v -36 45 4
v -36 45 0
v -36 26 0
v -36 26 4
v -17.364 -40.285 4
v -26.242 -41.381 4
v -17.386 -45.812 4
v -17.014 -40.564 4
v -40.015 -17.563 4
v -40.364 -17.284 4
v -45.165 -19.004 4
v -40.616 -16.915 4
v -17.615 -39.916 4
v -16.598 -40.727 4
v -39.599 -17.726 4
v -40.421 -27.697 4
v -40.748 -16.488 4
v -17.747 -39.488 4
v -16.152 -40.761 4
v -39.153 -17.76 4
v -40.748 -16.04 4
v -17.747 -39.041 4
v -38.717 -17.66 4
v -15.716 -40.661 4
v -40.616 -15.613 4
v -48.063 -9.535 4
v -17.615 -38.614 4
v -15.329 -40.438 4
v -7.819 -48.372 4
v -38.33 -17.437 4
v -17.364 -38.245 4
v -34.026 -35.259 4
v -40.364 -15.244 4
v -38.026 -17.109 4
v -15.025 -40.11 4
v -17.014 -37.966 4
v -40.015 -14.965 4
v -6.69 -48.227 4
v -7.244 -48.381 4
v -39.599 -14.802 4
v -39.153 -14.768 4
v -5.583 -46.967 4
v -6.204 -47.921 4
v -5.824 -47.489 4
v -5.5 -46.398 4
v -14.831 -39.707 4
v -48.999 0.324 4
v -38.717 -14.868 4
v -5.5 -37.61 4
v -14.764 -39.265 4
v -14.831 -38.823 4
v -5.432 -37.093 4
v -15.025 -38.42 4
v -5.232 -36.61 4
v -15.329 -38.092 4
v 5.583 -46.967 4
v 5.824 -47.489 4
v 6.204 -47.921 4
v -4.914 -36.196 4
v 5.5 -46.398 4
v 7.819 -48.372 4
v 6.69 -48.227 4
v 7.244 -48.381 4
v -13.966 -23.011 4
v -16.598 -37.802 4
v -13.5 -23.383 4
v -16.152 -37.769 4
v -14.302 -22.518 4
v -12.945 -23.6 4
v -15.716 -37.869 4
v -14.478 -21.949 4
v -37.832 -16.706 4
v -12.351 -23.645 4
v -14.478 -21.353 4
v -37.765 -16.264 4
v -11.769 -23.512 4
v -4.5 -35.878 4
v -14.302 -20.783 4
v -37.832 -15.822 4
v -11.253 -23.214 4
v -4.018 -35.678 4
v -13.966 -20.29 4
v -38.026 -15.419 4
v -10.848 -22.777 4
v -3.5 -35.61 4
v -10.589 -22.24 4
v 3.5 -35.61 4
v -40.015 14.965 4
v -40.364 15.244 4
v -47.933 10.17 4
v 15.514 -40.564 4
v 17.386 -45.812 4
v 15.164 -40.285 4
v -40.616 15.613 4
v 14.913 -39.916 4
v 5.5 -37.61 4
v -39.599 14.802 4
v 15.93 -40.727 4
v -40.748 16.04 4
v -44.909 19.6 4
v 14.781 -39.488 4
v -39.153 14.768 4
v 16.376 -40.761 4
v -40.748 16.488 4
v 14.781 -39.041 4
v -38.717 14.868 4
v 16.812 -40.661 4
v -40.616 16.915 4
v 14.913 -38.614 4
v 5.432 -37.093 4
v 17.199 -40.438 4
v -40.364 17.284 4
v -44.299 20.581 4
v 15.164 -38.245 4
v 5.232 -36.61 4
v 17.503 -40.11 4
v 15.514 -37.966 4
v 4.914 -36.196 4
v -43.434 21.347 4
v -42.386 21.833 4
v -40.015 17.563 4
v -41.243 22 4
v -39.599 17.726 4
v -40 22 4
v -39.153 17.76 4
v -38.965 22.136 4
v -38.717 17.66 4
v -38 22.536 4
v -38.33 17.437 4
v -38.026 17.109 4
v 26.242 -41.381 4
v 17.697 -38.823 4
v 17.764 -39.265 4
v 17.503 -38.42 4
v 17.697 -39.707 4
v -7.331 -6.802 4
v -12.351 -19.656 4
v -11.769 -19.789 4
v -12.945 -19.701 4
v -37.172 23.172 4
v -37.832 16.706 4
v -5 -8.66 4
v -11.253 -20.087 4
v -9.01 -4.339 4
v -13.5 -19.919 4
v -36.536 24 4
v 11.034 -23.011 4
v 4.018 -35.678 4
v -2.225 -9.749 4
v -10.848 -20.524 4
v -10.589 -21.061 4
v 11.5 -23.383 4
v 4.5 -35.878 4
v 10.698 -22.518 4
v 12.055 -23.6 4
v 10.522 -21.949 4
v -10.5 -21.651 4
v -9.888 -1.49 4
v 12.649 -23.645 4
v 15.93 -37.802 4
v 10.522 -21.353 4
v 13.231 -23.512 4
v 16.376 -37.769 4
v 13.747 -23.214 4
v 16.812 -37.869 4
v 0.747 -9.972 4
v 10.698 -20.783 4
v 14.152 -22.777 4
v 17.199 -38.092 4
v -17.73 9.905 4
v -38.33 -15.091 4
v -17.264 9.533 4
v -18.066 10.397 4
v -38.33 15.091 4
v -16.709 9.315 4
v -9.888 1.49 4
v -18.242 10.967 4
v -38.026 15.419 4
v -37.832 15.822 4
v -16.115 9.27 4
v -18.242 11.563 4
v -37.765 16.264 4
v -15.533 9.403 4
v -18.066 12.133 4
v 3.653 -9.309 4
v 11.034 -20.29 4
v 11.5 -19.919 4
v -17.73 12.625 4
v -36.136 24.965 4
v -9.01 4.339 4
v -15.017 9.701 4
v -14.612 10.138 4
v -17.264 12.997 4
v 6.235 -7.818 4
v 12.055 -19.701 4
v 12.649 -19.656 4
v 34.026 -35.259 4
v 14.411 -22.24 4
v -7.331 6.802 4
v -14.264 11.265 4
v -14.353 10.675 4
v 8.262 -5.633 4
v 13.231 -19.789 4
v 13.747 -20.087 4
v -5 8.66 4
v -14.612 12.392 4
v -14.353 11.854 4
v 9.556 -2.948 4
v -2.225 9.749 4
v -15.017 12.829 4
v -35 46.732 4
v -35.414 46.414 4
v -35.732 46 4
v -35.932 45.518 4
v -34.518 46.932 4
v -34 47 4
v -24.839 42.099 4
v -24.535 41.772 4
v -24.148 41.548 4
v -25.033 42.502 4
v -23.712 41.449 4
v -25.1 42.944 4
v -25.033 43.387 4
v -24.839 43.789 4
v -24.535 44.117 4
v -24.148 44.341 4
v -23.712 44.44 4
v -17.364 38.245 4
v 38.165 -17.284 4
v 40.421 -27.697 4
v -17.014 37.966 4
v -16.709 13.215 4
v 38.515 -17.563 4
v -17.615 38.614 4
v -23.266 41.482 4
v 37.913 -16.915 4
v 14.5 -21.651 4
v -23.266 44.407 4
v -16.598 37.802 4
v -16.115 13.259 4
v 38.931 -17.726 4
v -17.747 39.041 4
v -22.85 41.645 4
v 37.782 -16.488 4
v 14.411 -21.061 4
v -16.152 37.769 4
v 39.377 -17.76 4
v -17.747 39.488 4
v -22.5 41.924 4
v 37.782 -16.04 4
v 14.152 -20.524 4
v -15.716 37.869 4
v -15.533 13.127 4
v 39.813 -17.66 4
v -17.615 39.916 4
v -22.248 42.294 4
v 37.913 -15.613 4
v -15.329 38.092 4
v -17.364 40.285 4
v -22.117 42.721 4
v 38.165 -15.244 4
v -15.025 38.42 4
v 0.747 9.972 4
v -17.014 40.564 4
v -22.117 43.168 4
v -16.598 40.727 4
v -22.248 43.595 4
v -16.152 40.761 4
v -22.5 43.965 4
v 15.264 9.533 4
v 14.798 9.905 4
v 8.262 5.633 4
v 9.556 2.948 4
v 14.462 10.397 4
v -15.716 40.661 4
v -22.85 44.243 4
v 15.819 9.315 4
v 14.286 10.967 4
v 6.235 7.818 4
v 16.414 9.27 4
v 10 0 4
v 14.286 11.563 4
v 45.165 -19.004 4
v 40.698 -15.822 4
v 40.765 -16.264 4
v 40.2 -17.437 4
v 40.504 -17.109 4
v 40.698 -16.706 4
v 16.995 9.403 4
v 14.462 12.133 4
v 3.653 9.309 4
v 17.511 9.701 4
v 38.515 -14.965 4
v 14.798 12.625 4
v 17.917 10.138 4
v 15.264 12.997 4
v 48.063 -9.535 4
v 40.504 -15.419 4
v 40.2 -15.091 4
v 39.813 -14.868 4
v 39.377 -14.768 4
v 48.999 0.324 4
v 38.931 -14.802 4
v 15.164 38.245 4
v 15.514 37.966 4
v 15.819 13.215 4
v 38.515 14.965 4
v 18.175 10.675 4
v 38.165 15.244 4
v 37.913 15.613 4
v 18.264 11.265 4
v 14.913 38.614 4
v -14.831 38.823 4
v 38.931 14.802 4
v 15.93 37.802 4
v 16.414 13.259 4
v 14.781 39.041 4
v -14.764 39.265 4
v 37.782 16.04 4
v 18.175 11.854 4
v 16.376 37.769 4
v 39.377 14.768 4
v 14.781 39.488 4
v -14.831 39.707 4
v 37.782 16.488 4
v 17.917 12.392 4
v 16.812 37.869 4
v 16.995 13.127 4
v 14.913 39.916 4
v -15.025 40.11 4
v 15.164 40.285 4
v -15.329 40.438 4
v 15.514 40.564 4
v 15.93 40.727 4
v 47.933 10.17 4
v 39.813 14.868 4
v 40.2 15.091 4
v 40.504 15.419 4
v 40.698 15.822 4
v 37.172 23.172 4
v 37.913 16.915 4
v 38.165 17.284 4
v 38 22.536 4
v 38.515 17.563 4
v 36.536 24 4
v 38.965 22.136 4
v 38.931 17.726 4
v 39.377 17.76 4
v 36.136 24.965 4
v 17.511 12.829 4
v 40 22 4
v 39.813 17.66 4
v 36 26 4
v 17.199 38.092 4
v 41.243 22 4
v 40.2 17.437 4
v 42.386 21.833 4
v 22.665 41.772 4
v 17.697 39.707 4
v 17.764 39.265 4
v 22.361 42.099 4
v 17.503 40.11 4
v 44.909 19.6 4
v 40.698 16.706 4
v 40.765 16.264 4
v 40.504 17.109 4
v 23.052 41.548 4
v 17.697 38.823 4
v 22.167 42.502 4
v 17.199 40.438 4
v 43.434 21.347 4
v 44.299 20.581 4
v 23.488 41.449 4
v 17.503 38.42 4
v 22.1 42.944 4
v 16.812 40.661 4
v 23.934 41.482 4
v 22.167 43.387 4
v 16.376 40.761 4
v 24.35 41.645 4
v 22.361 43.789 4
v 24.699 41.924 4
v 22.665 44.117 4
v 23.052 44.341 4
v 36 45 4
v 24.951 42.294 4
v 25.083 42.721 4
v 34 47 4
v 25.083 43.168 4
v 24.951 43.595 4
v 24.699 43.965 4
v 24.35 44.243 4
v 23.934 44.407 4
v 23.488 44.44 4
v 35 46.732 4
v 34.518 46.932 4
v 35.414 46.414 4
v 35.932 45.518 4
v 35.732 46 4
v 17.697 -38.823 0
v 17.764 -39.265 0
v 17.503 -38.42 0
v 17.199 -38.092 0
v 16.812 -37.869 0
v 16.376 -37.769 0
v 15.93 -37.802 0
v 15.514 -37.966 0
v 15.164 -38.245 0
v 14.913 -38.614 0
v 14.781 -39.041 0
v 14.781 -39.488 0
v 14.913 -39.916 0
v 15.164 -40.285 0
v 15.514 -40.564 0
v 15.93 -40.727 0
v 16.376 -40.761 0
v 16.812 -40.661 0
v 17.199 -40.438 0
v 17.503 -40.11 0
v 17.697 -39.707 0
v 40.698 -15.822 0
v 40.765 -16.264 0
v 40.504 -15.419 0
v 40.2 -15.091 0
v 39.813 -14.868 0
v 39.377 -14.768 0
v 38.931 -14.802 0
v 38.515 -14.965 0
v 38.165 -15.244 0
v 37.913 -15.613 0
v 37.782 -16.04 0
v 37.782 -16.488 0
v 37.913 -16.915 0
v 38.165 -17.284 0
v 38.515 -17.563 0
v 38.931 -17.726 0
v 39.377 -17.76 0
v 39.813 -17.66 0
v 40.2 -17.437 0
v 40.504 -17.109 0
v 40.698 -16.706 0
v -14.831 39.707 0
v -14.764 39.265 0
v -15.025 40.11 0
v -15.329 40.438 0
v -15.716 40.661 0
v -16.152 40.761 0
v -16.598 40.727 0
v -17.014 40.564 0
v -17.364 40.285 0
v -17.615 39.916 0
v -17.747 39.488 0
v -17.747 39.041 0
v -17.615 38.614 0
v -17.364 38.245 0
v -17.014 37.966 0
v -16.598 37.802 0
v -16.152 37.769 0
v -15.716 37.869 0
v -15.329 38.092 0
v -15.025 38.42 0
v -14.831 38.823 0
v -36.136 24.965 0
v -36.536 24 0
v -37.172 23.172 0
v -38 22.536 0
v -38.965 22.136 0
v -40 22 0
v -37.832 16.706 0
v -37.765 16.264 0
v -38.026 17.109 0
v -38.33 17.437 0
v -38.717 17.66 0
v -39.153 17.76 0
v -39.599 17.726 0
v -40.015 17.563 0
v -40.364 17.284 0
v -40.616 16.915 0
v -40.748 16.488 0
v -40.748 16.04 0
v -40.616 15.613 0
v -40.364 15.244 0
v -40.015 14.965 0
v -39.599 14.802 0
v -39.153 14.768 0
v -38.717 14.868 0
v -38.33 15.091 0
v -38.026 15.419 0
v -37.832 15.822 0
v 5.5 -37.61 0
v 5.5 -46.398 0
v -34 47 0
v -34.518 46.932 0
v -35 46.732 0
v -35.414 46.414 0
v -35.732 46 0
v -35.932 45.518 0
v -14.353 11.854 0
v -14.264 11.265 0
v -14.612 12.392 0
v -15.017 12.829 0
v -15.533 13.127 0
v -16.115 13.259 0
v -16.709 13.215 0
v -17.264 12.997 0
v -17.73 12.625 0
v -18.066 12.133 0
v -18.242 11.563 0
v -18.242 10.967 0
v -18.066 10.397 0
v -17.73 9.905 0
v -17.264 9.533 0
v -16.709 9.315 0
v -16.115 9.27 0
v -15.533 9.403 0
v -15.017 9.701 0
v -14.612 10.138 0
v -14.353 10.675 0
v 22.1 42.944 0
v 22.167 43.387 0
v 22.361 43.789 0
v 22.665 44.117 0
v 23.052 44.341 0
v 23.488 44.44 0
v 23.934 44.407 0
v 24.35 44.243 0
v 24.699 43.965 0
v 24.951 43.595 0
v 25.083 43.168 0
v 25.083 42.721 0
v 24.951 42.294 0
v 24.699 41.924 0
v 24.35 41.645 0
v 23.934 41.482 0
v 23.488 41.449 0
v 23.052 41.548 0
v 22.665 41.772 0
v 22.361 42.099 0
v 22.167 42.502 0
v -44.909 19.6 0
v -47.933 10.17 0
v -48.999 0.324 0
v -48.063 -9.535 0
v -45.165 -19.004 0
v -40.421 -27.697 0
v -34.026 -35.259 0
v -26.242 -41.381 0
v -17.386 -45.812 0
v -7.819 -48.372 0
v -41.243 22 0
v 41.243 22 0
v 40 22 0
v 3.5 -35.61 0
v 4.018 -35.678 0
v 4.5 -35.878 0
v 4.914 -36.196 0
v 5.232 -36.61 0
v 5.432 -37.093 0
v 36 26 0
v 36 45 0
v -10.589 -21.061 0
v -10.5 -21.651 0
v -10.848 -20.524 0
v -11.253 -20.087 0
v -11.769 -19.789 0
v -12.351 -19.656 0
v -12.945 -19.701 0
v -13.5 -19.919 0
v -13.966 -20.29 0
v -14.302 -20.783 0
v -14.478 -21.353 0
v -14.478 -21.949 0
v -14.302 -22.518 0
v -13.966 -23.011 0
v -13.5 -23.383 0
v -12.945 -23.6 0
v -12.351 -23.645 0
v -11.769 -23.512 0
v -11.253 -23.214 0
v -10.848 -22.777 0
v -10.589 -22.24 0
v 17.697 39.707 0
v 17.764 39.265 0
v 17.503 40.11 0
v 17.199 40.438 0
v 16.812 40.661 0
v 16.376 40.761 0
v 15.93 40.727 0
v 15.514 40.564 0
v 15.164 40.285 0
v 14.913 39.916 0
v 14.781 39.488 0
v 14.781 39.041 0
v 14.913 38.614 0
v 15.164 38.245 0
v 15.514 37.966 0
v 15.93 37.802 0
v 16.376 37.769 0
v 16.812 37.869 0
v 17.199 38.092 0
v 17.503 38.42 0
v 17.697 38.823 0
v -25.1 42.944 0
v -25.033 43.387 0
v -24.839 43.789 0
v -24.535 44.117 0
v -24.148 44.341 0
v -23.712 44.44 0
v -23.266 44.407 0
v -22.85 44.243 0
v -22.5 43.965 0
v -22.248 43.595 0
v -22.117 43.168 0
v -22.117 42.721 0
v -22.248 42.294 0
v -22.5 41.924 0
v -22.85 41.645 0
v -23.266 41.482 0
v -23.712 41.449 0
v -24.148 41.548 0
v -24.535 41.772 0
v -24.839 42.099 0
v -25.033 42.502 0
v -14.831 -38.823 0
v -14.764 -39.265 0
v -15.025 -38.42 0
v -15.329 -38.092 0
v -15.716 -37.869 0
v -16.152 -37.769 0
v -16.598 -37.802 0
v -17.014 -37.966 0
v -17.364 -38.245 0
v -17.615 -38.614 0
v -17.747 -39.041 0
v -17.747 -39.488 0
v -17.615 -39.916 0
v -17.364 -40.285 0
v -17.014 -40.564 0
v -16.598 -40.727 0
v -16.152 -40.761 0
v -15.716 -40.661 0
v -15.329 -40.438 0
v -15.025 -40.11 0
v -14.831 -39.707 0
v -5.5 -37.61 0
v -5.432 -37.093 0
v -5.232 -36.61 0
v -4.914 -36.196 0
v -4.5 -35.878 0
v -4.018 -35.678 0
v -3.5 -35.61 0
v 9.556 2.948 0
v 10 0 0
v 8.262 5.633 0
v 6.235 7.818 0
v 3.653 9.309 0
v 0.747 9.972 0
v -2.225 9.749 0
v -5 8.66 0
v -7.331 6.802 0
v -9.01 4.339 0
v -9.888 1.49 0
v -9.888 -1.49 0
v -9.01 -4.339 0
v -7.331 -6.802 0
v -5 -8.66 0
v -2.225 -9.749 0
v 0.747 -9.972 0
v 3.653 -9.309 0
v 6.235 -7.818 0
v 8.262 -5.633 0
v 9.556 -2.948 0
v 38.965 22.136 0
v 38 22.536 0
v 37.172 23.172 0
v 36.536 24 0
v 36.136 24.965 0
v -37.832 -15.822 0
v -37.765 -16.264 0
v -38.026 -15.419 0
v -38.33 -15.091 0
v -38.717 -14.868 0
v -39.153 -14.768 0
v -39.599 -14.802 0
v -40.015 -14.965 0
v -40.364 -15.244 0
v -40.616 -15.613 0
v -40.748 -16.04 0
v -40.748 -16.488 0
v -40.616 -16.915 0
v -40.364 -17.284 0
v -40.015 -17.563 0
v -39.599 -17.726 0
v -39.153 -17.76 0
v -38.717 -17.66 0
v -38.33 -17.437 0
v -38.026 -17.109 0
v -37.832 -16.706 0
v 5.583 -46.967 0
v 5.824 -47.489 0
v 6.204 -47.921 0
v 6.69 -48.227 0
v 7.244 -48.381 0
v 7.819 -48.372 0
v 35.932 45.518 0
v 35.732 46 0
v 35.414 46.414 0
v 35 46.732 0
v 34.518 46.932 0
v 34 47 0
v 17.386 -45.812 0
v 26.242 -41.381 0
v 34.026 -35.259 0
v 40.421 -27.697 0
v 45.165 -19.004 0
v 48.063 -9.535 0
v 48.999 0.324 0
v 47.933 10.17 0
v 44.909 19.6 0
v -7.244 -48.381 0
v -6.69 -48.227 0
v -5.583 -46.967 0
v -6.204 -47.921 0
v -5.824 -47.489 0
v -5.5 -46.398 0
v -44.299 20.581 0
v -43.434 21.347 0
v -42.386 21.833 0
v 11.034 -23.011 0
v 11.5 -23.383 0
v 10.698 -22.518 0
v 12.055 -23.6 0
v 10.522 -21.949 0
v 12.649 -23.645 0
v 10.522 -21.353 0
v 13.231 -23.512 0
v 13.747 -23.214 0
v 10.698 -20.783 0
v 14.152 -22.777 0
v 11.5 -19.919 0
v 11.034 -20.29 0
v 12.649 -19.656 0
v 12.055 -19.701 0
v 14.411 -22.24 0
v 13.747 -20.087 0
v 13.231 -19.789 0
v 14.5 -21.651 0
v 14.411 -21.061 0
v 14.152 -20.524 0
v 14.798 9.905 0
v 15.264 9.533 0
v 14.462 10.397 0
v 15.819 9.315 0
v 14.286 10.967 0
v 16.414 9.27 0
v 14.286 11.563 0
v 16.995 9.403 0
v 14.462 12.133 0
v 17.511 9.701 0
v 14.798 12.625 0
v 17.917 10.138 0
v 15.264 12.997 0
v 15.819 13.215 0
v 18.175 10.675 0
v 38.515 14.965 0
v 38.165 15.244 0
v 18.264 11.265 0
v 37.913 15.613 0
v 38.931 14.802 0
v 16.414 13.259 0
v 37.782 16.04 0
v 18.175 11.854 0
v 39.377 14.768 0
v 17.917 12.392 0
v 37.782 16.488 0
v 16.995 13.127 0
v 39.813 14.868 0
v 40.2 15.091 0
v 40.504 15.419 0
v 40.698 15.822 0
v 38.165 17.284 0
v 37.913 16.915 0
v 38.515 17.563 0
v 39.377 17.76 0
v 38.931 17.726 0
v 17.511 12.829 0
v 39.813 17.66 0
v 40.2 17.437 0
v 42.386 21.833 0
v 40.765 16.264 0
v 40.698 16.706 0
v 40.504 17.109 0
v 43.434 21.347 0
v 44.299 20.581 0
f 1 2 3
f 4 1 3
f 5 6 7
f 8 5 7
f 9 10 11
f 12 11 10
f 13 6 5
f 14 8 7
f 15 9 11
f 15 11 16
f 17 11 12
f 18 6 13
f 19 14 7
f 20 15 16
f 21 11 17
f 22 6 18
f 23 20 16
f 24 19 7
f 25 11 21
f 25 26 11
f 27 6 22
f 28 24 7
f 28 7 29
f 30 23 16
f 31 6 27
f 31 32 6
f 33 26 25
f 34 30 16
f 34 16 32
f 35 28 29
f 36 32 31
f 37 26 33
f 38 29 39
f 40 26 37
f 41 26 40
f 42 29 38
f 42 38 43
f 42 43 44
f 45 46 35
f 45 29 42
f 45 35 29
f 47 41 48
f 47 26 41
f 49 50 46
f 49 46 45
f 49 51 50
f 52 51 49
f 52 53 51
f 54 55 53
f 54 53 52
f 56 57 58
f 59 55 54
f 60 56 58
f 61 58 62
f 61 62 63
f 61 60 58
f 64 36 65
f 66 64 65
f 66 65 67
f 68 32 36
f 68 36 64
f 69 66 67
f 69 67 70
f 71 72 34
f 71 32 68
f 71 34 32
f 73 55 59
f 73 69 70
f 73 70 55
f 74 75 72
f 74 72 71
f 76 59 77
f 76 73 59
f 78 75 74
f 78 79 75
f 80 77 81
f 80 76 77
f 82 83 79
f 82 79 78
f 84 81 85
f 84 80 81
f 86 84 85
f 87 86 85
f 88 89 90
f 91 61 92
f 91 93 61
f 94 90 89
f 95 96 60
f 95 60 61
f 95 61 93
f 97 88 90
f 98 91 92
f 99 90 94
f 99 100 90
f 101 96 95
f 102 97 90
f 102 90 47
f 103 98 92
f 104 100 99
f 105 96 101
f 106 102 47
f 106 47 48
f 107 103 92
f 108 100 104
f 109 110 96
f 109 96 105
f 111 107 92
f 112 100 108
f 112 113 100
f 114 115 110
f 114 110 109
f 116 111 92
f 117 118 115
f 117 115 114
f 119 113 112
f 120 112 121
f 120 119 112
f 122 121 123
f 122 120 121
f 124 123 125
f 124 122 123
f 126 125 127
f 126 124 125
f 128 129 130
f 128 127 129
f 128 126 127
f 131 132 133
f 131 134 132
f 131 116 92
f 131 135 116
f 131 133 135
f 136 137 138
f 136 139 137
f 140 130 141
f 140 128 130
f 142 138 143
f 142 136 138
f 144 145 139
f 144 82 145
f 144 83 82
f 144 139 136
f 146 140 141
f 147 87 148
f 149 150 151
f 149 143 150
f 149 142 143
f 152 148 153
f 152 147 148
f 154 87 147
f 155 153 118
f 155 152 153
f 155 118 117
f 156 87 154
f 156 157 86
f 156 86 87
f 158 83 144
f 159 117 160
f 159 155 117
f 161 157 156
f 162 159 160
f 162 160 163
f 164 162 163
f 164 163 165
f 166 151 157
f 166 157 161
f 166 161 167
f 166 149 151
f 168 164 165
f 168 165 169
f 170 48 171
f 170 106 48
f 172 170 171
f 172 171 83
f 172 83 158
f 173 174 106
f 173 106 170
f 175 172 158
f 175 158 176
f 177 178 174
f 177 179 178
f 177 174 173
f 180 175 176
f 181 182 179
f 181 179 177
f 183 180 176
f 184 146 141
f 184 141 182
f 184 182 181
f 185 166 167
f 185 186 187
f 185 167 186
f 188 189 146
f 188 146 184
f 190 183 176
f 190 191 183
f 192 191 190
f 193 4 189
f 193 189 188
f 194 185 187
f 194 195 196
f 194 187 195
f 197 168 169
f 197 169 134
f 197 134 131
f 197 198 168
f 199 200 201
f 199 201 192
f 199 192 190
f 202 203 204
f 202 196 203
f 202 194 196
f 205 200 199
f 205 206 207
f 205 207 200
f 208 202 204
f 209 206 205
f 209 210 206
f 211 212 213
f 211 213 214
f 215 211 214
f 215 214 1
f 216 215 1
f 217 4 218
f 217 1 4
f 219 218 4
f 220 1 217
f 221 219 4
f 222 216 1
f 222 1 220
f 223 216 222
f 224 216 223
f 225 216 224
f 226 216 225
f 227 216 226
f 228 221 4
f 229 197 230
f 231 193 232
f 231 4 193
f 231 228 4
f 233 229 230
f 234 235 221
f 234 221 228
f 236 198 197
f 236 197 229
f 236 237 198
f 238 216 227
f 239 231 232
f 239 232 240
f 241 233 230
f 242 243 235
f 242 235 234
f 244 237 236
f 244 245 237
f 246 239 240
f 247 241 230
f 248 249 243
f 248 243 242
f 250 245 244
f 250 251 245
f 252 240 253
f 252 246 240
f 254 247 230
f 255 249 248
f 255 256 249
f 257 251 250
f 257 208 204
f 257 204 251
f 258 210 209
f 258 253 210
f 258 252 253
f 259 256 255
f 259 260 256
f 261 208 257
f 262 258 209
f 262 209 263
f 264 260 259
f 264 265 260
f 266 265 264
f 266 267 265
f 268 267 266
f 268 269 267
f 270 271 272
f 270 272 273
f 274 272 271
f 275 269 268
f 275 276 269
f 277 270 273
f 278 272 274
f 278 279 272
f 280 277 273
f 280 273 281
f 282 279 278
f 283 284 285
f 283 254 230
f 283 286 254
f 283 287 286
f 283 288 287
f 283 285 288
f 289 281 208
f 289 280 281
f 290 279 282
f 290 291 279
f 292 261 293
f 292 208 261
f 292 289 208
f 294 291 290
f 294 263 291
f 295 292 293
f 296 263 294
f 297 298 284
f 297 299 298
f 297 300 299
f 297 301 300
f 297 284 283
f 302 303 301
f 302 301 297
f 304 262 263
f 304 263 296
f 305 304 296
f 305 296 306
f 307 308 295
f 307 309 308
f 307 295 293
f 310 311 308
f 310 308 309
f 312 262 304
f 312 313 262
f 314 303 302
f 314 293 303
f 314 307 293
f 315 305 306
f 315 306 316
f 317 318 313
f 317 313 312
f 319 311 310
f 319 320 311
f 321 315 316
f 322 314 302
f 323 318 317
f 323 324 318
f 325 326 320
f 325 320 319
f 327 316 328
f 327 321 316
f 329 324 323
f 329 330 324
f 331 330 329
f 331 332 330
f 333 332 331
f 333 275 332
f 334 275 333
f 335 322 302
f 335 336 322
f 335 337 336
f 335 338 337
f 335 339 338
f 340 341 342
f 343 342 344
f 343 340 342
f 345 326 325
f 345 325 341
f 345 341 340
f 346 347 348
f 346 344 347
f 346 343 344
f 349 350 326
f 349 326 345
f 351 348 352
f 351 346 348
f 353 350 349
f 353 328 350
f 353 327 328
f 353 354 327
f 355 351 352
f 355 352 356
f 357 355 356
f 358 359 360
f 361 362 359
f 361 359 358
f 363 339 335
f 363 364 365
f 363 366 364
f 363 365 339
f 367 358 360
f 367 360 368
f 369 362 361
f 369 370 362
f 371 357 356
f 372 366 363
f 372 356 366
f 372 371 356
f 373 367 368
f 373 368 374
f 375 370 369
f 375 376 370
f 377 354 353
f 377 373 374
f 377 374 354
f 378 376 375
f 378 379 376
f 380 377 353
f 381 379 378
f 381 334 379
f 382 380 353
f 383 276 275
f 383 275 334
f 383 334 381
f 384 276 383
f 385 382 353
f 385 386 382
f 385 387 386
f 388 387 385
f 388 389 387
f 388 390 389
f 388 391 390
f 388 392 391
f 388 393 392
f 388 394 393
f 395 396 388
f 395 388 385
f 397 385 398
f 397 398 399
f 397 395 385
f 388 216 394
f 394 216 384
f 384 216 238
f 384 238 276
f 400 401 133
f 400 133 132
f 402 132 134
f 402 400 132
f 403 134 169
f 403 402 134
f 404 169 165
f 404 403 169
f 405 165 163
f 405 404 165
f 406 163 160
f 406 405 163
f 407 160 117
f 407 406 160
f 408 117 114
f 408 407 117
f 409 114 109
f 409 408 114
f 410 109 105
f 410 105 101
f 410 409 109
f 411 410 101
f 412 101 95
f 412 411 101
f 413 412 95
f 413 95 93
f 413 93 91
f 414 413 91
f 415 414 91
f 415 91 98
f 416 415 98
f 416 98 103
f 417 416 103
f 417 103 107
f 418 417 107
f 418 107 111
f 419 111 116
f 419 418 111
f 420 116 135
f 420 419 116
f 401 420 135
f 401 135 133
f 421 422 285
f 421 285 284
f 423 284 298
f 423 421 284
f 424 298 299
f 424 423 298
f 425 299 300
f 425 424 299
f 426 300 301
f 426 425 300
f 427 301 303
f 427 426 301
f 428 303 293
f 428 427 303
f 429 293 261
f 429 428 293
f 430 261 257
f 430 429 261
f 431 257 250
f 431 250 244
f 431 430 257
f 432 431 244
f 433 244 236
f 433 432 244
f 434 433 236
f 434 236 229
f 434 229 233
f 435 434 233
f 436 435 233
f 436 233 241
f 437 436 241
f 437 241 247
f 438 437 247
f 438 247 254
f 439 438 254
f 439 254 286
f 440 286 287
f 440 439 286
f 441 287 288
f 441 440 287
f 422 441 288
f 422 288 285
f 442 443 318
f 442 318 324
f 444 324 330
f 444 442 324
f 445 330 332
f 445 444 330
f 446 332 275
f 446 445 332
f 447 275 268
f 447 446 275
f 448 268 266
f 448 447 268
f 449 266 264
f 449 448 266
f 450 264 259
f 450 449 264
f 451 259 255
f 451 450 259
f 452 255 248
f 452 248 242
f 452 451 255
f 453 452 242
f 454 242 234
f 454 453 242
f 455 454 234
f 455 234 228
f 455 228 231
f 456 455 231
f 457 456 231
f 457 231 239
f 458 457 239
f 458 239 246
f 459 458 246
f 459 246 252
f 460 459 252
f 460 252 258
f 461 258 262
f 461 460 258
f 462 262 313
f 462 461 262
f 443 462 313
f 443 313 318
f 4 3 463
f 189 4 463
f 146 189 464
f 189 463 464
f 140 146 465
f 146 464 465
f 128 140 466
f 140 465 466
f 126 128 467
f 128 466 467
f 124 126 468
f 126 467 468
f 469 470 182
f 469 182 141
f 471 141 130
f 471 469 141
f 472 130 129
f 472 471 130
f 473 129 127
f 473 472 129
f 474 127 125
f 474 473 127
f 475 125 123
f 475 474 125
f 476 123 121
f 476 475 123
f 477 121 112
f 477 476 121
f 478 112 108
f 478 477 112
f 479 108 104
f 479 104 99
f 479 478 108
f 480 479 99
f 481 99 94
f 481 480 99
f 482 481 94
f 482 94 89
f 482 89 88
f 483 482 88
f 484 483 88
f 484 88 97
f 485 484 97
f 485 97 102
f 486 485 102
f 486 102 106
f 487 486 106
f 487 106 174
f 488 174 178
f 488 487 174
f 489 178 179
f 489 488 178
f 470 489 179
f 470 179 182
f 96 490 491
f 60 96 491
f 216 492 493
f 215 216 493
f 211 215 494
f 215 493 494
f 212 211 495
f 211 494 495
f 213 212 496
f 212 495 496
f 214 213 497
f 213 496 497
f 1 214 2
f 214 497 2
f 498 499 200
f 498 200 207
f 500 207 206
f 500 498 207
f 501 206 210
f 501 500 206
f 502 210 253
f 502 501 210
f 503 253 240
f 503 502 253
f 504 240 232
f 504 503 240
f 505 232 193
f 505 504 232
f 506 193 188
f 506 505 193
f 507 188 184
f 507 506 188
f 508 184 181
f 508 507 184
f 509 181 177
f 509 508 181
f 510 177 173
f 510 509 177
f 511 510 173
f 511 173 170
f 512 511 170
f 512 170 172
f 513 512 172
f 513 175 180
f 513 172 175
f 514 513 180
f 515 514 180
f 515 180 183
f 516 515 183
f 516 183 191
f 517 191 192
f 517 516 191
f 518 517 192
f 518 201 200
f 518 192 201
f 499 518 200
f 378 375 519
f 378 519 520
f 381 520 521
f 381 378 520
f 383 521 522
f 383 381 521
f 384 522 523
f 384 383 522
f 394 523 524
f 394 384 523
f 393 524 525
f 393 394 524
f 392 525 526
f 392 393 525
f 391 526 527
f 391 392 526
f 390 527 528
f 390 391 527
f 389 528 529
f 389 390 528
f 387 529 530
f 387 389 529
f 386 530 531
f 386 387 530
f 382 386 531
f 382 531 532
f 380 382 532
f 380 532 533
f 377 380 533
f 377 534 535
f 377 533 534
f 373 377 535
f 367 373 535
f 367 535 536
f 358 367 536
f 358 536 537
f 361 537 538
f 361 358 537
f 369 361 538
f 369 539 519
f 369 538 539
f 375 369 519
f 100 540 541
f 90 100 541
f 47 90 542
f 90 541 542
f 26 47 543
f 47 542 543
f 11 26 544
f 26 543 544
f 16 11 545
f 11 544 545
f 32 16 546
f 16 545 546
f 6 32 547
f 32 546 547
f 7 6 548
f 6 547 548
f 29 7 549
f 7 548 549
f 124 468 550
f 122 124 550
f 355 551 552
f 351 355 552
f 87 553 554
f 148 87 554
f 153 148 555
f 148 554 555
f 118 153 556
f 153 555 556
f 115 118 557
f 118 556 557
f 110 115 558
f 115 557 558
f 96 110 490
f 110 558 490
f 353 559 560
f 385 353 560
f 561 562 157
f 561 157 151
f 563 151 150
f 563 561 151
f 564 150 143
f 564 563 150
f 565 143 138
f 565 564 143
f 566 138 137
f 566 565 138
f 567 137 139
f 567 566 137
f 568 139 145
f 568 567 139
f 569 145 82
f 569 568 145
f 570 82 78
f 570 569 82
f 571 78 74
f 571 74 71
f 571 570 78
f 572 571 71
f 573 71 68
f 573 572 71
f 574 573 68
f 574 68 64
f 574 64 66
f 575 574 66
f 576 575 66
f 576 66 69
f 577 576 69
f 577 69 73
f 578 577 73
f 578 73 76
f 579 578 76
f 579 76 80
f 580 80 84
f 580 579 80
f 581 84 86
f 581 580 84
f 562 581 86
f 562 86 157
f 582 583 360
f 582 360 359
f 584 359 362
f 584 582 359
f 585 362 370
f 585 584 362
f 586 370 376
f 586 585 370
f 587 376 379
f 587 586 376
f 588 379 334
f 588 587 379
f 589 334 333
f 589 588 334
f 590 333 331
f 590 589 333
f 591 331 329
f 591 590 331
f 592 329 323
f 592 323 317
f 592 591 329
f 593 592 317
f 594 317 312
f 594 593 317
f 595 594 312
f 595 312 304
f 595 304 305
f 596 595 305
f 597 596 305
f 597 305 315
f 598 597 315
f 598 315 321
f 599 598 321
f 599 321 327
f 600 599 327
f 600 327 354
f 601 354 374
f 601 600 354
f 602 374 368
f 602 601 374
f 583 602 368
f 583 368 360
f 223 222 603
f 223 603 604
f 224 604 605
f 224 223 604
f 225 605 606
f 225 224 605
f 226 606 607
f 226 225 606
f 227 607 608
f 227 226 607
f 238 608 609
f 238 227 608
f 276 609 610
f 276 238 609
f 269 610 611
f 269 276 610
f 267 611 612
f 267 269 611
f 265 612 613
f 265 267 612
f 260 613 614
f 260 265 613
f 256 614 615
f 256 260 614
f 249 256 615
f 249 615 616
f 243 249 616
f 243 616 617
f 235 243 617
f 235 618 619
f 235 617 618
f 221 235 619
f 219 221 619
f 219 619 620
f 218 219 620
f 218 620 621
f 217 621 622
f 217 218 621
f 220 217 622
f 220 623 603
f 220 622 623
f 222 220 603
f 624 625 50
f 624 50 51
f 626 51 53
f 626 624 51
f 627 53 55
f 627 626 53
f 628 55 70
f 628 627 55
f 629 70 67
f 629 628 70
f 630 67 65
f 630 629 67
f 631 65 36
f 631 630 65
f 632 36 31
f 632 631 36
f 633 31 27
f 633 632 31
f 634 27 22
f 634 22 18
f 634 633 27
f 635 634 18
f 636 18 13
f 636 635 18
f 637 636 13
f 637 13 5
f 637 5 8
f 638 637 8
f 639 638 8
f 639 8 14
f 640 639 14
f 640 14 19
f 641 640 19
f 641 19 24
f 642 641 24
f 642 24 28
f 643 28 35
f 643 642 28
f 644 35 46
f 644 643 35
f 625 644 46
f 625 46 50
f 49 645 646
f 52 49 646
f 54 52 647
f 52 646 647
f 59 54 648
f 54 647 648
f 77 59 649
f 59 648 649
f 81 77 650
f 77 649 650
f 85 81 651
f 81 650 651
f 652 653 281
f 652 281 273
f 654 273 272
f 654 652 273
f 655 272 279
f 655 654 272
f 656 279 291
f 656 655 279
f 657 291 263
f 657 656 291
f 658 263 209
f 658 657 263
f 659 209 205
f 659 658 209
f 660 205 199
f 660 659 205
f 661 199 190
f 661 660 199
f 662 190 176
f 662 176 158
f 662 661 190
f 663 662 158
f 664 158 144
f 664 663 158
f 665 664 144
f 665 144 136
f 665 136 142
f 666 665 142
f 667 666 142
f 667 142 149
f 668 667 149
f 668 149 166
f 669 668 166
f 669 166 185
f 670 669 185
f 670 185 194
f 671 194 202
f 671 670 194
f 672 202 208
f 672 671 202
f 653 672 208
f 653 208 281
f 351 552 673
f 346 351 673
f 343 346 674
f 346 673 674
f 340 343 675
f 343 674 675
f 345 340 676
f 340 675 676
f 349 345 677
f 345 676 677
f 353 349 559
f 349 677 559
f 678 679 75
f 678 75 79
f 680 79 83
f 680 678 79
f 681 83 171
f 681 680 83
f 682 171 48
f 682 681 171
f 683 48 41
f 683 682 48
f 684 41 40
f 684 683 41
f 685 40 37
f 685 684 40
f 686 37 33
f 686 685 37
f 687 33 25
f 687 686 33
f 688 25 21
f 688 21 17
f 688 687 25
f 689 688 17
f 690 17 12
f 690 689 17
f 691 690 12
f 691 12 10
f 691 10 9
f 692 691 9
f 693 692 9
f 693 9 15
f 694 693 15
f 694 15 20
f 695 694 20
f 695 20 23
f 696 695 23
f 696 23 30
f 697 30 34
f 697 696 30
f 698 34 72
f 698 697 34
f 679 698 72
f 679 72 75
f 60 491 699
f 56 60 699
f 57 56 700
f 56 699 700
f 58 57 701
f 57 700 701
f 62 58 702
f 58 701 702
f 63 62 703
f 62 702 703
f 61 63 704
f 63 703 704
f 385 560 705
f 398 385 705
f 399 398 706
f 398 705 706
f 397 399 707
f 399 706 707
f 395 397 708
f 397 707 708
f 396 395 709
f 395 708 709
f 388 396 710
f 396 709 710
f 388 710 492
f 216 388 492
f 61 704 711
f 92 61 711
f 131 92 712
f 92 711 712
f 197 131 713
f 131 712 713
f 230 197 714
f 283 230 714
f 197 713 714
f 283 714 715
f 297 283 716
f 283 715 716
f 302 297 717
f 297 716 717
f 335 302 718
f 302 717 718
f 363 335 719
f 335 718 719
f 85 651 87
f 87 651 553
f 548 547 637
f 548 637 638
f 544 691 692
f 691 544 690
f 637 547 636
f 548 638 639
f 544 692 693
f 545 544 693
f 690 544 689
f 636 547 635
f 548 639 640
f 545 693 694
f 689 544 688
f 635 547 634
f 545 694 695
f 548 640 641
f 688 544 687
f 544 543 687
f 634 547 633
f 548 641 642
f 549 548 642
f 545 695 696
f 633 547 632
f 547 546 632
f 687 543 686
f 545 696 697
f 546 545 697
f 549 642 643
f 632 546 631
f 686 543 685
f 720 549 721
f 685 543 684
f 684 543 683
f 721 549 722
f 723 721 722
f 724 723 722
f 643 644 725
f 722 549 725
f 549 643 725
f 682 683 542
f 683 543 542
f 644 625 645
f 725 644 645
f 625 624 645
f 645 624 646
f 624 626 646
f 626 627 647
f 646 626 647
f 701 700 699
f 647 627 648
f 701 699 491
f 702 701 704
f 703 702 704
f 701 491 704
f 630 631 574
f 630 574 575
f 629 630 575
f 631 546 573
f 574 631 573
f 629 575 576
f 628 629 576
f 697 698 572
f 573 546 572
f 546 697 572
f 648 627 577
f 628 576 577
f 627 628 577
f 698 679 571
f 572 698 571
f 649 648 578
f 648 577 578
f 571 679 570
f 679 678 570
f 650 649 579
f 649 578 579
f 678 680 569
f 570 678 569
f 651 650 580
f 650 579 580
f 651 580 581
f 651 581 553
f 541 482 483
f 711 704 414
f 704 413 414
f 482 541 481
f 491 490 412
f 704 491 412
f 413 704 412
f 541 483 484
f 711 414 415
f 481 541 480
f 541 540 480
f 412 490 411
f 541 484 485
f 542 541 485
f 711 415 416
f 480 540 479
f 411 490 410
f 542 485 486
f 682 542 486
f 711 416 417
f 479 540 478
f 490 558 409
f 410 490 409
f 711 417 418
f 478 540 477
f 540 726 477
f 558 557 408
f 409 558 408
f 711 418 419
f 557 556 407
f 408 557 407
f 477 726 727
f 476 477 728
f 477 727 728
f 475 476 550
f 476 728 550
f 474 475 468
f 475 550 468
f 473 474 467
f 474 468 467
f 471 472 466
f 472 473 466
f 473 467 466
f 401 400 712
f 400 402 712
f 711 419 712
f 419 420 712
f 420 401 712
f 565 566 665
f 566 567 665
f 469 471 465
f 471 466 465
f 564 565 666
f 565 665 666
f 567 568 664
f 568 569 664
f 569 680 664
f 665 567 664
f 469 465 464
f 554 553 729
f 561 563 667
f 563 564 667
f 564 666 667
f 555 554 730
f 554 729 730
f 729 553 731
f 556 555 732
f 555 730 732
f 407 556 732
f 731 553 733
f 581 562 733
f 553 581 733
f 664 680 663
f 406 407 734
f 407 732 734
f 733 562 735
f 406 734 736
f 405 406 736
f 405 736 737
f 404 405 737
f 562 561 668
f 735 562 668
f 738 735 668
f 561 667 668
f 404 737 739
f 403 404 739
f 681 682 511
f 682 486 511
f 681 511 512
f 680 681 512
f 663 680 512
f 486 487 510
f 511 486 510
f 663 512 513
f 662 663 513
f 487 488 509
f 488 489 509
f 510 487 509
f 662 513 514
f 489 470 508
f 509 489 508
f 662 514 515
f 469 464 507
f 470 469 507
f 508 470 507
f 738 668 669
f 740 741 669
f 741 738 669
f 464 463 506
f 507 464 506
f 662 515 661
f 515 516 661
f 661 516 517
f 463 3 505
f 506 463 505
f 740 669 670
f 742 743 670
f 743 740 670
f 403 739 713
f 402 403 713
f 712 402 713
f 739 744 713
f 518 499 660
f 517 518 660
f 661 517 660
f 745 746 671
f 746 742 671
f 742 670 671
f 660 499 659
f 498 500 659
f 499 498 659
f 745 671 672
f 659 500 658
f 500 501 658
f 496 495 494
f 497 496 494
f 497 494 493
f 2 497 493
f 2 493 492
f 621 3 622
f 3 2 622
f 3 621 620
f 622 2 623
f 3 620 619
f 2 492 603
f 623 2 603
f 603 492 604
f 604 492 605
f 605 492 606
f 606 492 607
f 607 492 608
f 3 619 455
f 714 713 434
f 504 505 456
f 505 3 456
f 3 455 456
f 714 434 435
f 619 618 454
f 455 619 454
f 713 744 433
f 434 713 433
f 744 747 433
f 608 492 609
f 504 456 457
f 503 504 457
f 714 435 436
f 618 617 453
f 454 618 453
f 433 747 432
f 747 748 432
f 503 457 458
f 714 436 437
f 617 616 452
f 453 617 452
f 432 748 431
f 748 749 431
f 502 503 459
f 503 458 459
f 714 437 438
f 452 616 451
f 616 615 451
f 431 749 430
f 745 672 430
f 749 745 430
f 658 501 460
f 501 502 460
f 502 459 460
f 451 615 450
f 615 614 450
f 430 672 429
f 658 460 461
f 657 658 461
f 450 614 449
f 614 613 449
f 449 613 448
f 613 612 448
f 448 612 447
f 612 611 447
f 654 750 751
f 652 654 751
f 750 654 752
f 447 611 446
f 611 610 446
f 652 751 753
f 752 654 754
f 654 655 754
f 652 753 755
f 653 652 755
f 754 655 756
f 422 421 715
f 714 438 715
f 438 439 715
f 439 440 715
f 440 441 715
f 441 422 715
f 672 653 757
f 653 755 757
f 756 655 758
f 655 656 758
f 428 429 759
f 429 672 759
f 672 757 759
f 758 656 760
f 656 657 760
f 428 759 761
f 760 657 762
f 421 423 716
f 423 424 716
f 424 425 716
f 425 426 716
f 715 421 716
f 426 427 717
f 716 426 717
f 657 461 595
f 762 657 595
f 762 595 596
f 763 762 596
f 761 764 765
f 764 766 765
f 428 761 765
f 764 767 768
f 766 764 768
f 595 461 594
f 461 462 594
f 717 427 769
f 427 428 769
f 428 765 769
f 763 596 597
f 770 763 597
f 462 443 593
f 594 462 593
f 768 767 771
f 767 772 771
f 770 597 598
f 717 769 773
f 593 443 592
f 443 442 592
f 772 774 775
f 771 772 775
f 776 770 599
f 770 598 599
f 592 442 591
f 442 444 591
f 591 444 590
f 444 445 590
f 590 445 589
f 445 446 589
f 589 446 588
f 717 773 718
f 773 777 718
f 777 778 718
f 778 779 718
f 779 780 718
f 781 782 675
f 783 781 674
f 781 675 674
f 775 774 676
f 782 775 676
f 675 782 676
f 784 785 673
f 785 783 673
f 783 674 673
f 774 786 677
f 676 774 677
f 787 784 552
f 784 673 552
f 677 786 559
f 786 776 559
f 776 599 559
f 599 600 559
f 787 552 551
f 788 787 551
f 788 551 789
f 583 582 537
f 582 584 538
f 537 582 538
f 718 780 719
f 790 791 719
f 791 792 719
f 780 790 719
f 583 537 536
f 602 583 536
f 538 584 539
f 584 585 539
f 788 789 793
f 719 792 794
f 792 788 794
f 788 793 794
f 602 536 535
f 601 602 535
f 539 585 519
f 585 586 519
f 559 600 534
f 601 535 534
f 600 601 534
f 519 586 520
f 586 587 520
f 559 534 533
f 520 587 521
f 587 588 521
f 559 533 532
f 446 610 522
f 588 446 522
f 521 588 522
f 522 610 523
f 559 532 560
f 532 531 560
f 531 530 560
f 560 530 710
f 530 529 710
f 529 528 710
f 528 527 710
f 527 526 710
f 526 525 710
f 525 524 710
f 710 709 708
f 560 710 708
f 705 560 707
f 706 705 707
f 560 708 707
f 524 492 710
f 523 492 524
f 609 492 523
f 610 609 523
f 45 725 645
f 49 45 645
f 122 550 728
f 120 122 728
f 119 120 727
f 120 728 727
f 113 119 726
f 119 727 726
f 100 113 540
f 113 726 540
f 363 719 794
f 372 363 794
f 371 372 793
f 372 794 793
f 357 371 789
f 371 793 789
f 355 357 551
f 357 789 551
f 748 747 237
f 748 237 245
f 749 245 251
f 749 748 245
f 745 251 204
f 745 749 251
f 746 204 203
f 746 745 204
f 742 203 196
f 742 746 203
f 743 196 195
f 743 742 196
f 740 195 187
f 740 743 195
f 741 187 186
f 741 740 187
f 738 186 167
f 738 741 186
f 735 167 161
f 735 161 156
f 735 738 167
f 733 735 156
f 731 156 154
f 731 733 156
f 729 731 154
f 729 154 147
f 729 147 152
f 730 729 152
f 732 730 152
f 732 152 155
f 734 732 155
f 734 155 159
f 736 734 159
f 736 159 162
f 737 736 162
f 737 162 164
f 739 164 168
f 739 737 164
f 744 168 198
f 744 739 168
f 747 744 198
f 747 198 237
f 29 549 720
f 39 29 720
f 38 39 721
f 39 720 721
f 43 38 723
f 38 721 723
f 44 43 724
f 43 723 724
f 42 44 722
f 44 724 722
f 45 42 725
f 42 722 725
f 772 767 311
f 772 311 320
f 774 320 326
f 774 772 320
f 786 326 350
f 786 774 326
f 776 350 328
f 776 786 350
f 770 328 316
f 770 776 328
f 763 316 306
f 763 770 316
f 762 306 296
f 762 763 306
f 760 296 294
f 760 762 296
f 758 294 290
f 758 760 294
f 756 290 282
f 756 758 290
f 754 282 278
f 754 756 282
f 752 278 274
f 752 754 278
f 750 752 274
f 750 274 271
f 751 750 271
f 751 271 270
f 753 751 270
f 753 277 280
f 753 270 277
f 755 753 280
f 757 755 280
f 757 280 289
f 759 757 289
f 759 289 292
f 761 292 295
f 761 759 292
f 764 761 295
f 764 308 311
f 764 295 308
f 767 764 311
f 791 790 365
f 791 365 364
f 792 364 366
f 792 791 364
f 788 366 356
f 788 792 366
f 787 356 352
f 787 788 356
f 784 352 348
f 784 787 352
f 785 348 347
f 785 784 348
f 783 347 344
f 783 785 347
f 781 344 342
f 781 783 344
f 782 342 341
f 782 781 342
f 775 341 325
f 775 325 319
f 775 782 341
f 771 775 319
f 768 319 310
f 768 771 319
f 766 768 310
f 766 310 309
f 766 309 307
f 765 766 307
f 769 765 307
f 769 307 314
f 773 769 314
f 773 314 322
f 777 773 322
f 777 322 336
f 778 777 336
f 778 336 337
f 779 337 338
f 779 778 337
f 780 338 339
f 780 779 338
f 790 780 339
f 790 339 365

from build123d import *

# Parameters (mm, degrees)
SKETCH_1_R               = 10
SKETCH_1_R_2             = 2
SKETCH_1_R_3             = 1.5
EXTRUDE_1_DEPTH          = 4
CUT_EXTRUDE_1_DEPTH      = 69.987976837
CUT_EXTRUDE_1_DEPTH_BACK = 69.987976837
SKETCH_2_R               = 2
CUT_EXTRUDE_2_DEPTH      = 69.987976837
CUT_EXTRUDE_2_DEPTH_BACK = 69.987976837
SKETCH_3_R               = 1.5
CUT_EXTRUDE_3_DEPTH      = 69.987976837
CUT_EXTRUDE_3_DEPTH_BACK = 69.987976837
SKETCH_4_R               = 1.5


with BuildPart() as part:
    # 草图1 → 凸台-拉伸1 (new body)
    with BuildSketch(Plane.XY):
        with BuildLine():
            Line((-5.5, -46.397737014), (-5.5, -37.610257999))
            ThreePointArc((-5.5, -37.610257999), (-4.914213562, -36.196044437), (-3.5, -35.610257999))
            Line((-3.5, -35.610257999), (3.5, -35.610257999))
            ThreePointArc((3.5, -35.610257999), (4.914213562, -36.196044437), (5.5, -37.610257999))
            Line((5.5, -37.610257999), (5.5, -46.397737014))
            ThreePointArc((5.5, -46.397737014), (6.203523597, -47.920612234), (7.819148936, -48.372108802))
            ThreePointArc((7.819148936, -48.372108802), (43.01305257, -23.470775628), (44.909241811, 19.6))
            ThreePointArc((44.909241811, 19.6), (43.434071485, 21.346640106), (41.243181255, 22))
            Line((41.243181255, 22), (40, 22))
            ThreePointArc((40, 22), (37.171572875, 23.171572875), (36, 26))
            Line((36, 26), (36, 45))
            ThreePointArc((36, 45), (35.414213562, 46.414213562), (34, 47))
            Line((34, 47), (-34, 47))
            ThreePointArc((-34, 47), (-35.414213562, 46.414213562), (-36, 45))
            Line((-36, 45), (-36, 26))
            ThreePointArc((-36, 26), (-37.171572875, 23.171572875), (-40, 22))
            Line((-40, 22), (-41.243181255, 22))
            ThreePointArc((-41.243181255, 22), (-43.434071485, 21.346640106), (-44.909241811, 19.6))
            ThreePointArc((-44.909241811, 19.6), (-43.01305257, -23.470775628), (-7.819148936, -48.372108802))
            ThreePointArc((-7.819148936, -48.372108802), (-6.203523597, -47.920612234), (-5.5, -46.397737014))
        make_face()
        Circle(SKETCH_1_R, mode=Mode.SUBTRACT)
        with Locations((12.5, -21.650635095)):
            Circle(SKETCH_1_R_2, mode=Mode.SUBTRACT)
        with Locations((-12.5, -21.650635095)):
            Circle(SKETCH_1_R_2, mode=Mode.SUBTRACT)
        with Locations((-16.264045876, 39.264880132)):
            Circle(SKETCH_1_R_3, mode=Mode.SUBTRACT)
        with Locations((16.264045876, 39.264880132)):
            Circle(SKETCH_1_R_3, mode=Mode.SUBTRACT)
        with Locations((39.264880132, 16.264045876)):
            Circle(SKETCH_1_R_3, mode=Mode.SUBTRACT)
        with Locations((39.264880132, -16.264045876)):
            Circle(SKETCH_1_R_3, mode=Mode.SUBTRACT)
        with Locations((16.264045876, -39.264880132)):
            Circle(SKETCH_1_R_3, mode=Mode.SUBTRACT)
        with Locations((-16.264045876, -39.264880132)):
            Circle(SKETCH_1_R_3, mode=Mode.SUBTRACT)
        with Locations((-39.264880132, -16.264045876)):
            Circle(SKETCH_1_R_3, mode=Mode.SUBTRACT)
        with Locations((-39.264880132, 16.264045876)):
            Circle(SKETCH_1_R_3, mode=Mode.SUBTRACT)
    extrude(amount=EXTRUDE_1_DEPTH)

    # 草图2 → 切除-拉伸1 (cut, two sides: drawn at the far end of the back side and taken through both)
    with BuildSketch(Plane.XY.offset(4).offset(-CUT_EXTRUDE_1_DEPTH_BACK)):
        with Locations((-16.264045876, 11.264880132)):
            Circle(SKETCH_2_R)
        with Locations((16.264045876, 11.264880132)):
            Circle(SKETCH_2_R)
    extrude(amount=CUT_EXTRUDE_1_DEPTH + CUT_EXTRUDE_1_DEPTH_BACK, mode=Mode.SUBTRACT)

    # 草图3 → 切除-拉伸2 (cut, two sides: drawn at the far end of the back side and taken through both)
    with BuildSketch(Plane(origin=(0, 0, 0), x_dir=(-1, 0, 0), z_dir=(0, 0, -1)).offset(-CUT_EXTRUDE_2_DEPTH_BACK)):
        with Locations((-23.599902633, 42.944396943)):
            Circle(SKETCH_3_R)
    extrude(amount=CUT_EXTRUDE_2_DEPTH + CUT_EXTRUDE_2_DEPTH_BACK, mode=Mode.SUBTRACT)

    # 草图4 → 切除-拉伸3 (cut, two sides: drawn at the far end of the back side and taken through both)
    with BuildSketch(Plane(origin=(0, 0, 0), x_dir=(-1, 0, 0), z_dir=(0, 0, -1)).offset(-CUT_EXTRUDE_3_DEPTH_BACK)):
        with Locations((23.599902633, 42.944396943)):
            Circle(SKETCH_4_R)
    extrude(amount=CUT_EXTRUDE_3_DEPTH + CUT_EXTRUDE_3_DEPTH_BACK, mode=Mode.SUBTRACT)


solid = part.part
